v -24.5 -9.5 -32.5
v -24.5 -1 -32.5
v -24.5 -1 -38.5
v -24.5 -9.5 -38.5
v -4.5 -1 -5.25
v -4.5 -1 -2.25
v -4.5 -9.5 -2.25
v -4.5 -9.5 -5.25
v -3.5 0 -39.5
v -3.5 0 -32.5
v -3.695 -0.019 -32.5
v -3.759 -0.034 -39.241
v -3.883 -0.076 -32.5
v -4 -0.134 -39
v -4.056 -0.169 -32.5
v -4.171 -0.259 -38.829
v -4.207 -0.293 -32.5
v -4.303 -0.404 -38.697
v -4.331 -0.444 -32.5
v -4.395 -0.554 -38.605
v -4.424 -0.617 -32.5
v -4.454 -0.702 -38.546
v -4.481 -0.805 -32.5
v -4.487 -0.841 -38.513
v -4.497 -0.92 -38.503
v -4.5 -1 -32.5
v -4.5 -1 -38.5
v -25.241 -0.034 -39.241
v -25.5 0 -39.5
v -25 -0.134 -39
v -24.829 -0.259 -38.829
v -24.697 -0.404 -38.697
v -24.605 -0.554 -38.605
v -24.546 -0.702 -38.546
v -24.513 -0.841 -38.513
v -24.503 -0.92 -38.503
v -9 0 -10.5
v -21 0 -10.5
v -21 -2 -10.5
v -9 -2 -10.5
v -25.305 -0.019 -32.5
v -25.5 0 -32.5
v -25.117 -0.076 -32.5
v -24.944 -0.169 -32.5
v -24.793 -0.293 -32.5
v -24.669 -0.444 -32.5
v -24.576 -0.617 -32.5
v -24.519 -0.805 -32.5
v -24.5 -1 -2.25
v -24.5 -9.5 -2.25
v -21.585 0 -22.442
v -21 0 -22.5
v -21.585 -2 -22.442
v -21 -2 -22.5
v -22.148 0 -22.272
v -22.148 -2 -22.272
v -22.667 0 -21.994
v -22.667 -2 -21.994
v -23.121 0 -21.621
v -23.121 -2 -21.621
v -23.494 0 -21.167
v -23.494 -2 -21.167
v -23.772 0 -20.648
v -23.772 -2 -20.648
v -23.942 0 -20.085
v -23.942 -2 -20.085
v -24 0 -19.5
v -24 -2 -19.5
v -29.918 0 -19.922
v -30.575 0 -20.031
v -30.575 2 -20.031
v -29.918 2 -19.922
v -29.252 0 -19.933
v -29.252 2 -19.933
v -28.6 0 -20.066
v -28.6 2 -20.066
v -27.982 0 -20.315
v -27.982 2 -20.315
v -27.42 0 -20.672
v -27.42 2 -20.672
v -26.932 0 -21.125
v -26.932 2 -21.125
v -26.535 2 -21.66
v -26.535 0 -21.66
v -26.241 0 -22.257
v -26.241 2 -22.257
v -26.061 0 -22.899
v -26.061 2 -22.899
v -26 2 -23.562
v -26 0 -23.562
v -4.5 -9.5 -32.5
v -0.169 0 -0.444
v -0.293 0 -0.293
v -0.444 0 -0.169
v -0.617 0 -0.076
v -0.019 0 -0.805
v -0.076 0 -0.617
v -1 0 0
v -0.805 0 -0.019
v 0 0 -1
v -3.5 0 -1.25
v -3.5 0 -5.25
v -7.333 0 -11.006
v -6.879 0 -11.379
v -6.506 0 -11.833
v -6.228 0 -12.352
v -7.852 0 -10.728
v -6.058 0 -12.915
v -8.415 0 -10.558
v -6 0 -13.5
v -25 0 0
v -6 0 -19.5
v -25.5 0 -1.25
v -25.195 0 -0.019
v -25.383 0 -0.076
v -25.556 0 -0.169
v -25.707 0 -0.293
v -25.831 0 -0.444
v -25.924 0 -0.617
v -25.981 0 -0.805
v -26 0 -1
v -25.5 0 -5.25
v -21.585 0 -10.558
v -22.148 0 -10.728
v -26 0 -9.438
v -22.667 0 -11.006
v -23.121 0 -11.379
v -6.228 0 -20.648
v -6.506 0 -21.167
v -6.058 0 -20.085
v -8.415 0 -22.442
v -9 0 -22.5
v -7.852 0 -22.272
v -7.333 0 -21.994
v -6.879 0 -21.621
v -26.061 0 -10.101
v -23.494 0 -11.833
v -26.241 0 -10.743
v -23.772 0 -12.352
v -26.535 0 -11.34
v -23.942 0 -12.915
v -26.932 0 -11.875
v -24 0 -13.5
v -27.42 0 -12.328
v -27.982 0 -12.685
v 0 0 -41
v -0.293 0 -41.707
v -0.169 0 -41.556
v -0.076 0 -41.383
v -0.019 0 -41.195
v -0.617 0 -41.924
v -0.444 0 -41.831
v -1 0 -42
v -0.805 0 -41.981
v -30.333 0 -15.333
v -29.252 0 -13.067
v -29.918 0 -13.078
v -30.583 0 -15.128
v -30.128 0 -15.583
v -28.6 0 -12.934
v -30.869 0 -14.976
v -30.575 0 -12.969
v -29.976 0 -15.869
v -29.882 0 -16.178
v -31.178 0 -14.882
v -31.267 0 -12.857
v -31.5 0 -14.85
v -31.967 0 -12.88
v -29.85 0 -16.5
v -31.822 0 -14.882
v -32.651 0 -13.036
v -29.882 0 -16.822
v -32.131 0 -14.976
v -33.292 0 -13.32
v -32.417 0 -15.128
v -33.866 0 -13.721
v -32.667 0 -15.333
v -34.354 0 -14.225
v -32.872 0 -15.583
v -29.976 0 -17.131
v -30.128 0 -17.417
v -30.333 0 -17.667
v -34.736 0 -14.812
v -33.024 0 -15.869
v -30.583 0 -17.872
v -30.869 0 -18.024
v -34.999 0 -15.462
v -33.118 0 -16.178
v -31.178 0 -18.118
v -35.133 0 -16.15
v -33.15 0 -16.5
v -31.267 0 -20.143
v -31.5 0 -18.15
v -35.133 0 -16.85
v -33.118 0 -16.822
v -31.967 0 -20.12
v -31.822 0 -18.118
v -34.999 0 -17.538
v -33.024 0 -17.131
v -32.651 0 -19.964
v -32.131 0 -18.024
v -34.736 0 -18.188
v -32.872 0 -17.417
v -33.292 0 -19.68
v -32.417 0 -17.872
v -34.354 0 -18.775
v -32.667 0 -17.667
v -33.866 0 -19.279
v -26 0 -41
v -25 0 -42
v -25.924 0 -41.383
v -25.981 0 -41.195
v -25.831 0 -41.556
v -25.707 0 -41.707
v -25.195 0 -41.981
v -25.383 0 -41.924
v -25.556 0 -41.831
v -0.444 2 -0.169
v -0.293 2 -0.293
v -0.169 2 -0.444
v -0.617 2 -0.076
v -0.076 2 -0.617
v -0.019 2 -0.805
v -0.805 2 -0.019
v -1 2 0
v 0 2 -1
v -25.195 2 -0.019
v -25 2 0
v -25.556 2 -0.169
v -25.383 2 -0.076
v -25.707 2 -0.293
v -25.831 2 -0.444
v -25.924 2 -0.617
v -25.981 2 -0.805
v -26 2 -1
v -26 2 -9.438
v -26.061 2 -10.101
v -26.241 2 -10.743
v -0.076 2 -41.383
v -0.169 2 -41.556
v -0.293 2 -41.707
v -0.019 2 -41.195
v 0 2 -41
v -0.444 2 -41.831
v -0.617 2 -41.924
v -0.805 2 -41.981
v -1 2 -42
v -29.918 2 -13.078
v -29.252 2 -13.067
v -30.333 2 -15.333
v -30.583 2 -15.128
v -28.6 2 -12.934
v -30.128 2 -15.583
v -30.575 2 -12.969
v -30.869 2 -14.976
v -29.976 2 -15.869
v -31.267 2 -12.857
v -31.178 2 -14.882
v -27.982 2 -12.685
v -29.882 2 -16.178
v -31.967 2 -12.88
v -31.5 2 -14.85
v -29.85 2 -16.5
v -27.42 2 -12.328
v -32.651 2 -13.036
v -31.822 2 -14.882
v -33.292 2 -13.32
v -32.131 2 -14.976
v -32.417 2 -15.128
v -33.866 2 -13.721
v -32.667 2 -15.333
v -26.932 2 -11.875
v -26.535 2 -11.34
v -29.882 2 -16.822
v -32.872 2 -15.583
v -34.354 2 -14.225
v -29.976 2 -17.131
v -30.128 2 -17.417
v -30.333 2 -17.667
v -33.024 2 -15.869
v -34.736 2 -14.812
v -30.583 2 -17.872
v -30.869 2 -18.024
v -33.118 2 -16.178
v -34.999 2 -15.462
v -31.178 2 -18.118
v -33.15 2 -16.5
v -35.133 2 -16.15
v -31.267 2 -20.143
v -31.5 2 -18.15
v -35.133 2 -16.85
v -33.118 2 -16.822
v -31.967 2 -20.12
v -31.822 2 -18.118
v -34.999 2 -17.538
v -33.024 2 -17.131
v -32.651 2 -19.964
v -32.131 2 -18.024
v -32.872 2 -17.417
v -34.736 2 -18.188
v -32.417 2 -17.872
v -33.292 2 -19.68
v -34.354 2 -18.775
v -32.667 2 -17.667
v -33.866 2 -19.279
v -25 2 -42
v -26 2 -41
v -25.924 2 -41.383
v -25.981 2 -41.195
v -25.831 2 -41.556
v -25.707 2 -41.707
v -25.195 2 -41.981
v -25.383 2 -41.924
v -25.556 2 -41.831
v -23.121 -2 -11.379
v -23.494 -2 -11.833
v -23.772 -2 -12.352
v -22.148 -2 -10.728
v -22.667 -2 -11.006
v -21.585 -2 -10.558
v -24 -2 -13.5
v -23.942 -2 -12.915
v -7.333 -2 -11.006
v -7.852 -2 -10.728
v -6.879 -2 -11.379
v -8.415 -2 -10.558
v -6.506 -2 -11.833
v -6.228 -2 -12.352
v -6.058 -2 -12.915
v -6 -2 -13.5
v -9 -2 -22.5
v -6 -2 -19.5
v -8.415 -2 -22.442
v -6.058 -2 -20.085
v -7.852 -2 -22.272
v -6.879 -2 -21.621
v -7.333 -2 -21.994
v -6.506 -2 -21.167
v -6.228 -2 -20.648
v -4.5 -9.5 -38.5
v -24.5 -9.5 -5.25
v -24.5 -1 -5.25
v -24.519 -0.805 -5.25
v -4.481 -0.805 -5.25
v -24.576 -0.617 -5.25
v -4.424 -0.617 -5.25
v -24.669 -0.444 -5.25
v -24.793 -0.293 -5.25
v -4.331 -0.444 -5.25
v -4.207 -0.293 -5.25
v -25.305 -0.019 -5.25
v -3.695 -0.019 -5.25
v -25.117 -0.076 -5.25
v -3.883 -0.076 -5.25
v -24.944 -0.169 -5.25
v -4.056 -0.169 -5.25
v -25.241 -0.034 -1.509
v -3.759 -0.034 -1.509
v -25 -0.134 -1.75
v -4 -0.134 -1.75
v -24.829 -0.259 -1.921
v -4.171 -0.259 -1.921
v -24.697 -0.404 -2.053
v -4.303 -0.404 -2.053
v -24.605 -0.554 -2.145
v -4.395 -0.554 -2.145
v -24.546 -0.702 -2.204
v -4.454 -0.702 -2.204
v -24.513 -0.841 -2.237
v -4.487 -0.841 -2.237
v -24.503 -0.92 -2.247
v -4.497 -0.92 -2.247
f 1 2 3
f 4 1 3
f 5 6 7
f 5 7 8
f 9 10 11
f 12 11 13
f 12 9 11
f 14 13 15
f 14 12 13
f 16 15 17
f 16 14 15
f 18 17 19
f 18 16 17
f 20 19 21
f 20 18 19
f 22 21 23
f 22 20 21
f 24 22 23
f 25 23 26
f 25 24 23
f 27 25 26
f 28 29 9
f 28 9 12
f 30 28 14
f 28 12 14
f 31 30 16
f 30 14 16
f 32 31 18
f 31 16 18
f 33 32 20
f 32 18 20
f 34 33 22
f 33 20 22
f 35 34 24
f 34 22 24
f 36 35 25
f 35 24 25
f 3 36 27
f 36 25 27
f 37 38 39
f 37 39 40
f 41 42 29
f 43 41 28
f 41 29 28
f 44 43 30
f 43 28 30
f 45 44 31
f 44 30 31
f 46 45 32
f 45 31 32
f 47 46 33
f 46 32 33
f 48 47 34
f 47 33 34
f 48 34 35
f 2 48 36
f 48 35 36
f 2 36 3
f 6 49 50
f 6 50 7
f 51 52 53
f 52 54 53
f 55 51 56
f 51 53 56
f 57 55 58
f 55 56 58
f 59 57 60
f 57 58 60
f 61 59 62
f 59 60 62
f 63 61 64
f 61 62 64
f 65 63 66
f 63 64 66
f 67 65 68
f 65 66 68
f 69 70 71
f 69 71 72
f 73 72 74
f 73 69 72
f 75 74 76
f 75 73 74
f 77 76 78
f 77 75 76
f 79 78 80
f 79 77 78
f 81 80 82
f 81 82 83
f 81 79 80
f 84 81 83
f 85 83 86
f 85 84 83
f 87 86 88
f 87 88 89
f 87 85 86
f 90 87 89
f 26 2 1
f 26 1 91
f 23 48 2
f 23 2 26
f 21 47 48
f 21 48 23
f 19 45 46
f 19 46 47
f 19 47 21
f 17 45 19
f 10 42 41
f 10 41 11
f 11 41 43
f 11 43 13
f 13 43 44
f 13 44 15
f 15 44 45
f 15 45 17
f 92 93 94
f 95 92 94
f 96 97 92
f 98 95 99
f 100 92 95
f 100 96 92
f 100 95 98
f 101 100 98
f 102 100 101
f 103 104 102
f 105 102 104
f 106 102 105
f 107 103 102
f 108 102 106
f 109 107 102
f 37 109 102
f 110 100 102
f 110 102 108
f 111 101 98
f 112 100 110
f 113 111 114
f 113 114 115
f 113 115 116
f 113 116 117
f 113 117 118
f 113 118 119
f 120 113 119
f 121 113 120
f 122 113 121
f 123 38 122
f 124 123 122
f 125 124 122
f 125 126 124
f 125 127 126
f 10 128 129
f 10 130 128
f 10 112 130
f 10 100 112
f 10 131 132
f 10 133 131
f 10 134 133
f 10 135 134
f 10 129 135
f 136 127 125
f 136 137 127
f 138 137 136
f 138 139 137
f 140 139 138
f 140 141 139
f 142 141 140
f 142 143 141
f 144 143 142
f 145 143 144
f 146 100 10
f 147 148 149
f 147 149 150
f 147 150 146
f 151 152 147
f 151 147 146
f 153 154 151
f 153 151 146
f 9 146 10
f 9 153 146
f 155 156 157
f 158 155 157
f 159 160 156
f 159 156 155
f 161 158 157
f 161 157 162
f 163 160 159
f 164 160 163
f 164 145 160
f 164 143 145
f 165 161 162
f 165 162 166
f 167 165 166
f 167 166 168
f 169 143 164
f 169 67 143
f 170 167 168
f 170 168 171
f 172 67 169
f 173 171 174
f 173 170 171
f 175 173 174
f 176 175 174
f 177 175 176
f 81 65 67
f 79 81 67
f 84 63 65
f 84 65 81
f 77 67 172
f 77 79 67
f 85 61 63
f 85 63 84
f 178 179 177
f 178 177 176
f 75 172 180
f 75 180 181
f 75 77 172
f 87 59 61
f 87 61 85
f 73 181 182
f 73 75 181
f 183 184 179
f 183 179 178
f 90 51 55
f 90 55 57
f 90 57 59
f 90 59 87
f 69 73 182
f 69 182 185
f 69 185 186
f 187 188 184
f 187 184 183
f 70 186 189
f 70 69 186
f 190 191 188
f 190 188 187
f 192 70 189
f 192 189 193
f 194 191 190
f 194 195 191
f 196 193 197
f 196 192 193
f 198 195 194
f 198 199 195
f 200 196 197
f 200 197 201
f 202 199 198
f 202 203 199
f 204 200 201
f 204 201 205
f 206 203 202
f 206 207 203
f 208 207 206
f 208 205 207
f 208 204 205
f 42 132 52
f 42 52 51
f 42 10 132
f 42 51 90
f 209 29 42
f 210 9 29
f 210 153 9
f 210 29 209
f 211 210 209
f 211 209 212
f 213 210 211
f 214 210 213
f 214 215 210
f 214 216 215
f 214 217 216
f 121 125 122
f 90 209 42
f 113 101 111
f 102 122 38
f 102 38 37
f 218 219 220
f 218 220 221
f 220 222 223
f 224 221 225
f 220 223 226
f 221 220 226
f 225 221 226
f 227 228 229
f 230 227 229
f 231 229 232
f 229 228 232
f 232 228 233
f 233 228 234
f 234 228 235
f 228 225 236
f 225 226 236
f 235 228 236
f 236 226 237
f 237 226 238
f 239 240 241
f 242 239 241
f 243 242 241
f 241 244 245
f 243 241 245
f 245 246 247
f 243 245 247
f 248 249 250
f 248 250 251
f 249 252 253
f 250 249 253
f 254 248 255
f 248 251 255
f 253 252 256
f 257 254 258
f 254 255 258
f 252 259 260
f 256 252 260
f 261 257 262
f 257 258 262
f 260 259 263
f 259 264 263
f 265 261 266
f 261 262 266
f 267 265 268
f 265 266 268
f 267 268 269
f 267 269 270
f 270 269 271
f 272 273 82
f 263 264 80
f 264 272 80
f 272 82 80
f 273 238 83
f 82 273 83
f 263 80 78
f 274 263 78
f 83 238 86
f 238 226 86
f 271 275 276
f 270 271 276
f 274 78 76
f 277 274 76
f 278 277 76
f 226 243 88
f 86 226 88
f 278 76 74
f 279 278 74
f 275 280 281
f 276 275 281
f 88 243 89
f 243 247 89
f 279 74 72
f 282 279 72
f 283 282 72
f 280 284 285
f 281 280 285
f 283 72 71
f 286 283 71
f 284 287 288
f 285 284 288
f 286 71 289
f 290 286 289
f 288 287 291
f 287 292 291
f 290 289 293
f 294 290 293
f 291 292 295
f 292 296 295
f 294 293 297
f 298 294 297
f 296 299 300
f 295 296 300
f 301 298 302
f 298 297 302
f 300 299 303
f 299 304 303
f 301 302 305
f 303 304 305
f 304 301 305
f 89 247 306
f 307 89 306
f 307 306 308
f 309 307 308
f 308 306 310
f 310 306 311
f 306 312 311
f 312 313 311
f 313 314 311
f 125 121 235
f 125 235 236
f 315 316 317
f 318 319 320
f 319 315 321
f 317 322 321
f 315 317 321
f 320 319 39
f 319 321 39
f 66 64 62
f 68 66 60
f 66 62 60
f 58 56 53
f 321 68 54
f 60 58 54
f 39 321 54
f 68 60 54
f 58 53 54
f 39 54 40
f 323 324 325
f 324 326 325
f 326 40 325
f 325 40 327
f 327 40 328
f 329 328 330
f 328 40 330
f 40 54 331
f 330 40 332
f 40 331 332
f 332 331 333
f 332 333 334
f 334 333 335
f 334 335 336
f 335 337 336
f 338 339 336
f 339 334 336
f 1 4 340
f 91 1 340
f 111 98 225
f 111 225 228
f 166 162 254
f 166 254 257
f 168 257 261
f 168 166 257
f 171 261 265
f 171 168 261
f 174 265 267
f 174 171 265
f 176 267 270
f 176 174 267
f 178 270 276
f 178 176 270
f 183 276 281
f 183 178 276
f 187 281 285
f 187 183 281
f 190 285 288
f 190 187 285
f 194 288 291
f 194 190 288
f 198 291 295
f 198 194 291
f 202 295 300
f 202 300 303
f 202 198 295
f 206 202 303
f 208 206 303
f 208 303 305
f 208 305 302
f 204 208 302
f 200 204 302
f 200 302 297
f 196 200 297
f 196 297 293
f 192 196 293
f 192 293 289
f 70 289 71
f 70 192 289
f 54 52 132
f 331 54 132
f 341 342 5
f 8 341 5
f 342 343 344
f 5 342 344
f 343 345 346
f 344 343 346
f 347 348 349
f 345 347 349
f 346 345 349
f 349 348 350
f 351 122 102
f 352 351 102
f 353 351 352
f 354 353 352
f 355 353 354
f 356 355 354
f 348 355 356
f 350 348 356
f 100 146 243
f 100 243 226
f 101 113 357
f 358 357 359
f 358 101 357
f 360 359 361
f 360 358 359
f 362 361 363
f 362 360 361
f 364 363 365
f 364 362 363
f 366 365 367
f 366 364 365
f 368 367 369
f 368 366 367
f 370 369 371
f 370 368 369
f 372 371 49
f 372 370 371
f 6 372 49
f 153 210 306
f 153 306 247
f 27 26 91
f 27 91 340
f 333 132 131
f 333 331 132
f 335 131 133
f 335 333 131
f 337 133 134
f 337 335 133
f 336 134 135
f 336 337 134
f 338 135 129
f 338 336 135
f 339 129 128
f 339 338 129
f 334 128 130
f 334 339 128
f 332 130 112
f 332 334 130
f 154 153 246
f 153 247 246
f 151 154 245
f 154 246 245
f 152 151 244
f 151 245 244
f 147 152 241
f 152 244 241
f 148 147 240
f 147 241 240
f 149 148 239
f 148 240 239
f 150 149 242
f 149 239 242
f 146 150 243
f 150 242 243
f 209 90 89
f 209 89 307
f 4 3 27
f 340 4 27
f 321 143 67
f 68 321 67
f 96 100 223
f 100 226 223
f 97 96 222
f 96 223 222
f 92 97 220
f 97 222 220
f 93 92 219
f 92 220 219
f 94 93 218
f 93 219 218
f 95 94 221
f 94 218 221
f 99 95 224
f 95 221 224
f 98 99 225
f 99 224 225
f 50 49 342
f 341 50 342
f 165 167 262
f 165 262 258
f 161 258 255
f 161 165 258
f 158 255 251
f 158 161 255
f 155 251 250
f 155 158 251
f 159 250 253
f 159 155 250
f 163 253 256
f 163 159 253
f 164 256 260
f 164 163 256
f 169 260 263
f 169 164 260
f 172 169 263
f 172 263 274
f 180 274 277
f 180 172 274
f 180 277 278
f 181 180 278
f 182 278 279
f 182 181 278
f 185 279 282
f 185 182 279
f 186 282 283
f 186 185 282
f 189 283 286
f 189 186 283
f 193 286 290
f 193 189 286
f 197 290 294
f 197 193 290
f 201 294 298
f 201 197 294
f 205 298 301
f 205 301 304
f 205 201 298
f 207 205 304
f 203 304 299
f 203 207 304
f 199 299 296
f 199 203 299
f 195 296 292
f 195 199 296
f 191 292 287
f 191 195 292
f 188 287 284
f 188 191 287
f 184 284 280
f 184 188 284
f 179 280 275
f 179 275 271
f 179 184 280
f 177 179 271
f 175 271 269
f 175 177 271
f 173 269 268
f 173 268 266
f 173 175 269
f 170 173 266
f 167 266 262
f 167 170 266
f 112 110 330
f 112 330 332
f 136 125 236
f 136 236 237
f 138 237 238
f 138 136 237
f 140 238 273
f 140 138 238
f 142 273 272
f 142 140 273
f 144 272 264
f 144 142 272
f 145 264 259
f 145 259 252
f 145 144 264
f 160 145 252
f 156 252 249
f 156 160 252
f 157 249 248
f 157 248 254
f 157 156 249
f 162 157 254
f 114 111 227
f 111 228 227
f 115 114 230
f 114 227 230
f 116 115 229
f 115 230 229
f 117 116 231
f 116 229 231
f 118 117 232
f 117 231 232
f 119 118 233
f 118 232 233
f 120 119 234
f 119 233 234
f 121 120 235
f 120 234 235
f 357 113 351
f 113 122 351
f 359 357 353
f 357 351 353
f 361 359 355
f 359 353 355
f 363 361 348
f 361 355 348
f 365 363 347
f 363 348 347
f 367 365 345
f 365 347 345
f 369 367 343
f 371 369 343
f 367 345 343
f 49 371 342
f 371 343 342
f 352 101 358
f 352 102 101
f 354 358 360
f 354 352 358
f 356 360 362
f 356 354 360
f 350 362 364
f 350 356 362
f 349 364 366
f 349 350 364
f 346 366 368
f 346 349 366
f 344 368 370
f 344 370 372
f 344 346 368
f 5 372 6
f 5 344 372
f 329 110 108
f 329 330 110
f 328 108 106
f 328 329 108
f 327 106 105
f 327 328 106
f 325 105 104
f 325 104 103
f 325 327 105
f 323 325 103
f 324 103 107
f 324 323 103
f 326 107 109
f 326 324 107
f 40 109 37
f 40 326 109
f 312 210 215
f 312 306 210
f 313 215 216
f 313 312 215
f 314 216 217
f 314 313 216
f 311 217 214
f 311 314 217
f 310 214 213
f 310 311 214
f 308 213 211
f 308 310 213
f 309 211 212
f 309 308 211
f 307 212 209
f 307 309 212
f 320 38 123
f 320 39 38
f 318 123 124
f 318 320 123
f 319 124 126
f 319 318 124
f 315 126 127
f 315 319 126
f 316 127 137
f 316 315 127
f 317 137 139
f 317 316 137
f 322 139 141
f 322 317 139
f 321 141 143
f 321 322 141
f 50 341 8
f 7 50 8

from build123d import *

# Parameters (mm, degrees)
SKETCH1_R           = 1.65
BOSS_EXTRUDE1_DEPTH = 2
SKETCH3_W           = 18
SKETCH3_H           = 12
BOSS_EXTRUDE3_DEPTH = 2
SKETCH3_3_W         = 20
SKETCH3_3_H         = 3
SKETCH3_3_H_2       = 6
BOSS_EXTRUDE4_DEPTH = 9.5
FILLET1_R           = 1
FILLET2_R           = 3
FILLET3_R           = 1


with BuildPart() as part:
    # Sketch1 → Boss-Extrude1 (new body)
    with BuildSketch(Plane(origin=(0, 0, 0), x_dir=(1, 0, 0), z_dir=(0, 1, 0))):
        with BuildLine():
            Line((-26, 42), (0, 42))
            Line((0, 42), (0, 0))
            Line((0, 0), (-26, 0))
            Line((-26, 0), (-26, 9.438307568))
            ThreePointArc((-26, 9.438307568), (-27.419949552, 12.327836077), (-30.575, 12.969153784))
            ThreePointArc((-30.575, 12.969153784), (-35.15, 16.5), (-30.575, 20.030846216))
            ThreePointArc((-30.575, 20.030846216), (-27.419949552, 20.672163923), (-26, 23.561692432))
            Line((-26, 23.561692432), (-26, 42))
        make_face()
        with Locations(Location((-31.5, 16.5, 0), (0, 0, 270))):
            Circle(SKETCH1_R, mode=Mode.SUBTRACT)
    extrude(amount=BOSS_EXTRUDE1_DEPTH)

    # Sketch3 → Boss-Extrude3 (add)
    with BuildSketch(Plane(origin=(0, 0, 0), x_dir=(1, 0, 0), z_dir=(0, 1, 0))):
        with Locations((-15, 16.5)):
            Rectangle(SKETCH3_W, SKETCH3_H)
    extrude(amount=-BOSS_EXTRUDE3_DEPTH)

    # Sketch3<3> → Boss-Extrude4 (add)
    with BuildSketch(Plane(origin=(0, 0, 0), x_dir=(1, 0, 0), z_dir=(0, 1, 0))):
        with Locations((-14.5, 3.75)):
            Rectangle(SKETCH3_3_W, SKETCH3_3_H)
        with Locations((-14.5, 35.5)):
            Rectangle(SKETCH3_3_W, SKETCH3_3_H_2)
    extrude(amount=-BOSS_EXTRUDE4_DEPTH)

    # Fillet1
    fillet1_edges = [part.edges().sort_by_distance(p)[0] for p in [
        (-24.5, 0, -3.75),
        (-4.5, 0, -3.75),
        (-14.5, 0, -2.25),
        (-14.5, 0, -38.5),
        (-4.5, 0, -35.5),
        (-24.5, 0, -35.5),
    ]]
    fillet(fillet1_edges, radius=FILLET1_R)

    # Fillet2
    fillet2_edges = [part.edges().sort_by_distance(p)[0] for p in [
        (-6, -1, -10.5),
        (-24, -1, -10.5),
        (-24, -1, -22.5),
        (-6, -1, -22.5),
    ]]
    fillet(fillet2_edges, radius=FILLET2_R)

    # Fillet3
    fillet3_edges = [part.edges().sort_by_distance(p)[0] for p in [
        (-26, 1, -42),
        (0, 1, -42),
        (0, 1, 0),
        (-26, 1, 0),
    ]]
    fillet(fillet3_edges, radius=FILLET3_R)


solid = part.part
